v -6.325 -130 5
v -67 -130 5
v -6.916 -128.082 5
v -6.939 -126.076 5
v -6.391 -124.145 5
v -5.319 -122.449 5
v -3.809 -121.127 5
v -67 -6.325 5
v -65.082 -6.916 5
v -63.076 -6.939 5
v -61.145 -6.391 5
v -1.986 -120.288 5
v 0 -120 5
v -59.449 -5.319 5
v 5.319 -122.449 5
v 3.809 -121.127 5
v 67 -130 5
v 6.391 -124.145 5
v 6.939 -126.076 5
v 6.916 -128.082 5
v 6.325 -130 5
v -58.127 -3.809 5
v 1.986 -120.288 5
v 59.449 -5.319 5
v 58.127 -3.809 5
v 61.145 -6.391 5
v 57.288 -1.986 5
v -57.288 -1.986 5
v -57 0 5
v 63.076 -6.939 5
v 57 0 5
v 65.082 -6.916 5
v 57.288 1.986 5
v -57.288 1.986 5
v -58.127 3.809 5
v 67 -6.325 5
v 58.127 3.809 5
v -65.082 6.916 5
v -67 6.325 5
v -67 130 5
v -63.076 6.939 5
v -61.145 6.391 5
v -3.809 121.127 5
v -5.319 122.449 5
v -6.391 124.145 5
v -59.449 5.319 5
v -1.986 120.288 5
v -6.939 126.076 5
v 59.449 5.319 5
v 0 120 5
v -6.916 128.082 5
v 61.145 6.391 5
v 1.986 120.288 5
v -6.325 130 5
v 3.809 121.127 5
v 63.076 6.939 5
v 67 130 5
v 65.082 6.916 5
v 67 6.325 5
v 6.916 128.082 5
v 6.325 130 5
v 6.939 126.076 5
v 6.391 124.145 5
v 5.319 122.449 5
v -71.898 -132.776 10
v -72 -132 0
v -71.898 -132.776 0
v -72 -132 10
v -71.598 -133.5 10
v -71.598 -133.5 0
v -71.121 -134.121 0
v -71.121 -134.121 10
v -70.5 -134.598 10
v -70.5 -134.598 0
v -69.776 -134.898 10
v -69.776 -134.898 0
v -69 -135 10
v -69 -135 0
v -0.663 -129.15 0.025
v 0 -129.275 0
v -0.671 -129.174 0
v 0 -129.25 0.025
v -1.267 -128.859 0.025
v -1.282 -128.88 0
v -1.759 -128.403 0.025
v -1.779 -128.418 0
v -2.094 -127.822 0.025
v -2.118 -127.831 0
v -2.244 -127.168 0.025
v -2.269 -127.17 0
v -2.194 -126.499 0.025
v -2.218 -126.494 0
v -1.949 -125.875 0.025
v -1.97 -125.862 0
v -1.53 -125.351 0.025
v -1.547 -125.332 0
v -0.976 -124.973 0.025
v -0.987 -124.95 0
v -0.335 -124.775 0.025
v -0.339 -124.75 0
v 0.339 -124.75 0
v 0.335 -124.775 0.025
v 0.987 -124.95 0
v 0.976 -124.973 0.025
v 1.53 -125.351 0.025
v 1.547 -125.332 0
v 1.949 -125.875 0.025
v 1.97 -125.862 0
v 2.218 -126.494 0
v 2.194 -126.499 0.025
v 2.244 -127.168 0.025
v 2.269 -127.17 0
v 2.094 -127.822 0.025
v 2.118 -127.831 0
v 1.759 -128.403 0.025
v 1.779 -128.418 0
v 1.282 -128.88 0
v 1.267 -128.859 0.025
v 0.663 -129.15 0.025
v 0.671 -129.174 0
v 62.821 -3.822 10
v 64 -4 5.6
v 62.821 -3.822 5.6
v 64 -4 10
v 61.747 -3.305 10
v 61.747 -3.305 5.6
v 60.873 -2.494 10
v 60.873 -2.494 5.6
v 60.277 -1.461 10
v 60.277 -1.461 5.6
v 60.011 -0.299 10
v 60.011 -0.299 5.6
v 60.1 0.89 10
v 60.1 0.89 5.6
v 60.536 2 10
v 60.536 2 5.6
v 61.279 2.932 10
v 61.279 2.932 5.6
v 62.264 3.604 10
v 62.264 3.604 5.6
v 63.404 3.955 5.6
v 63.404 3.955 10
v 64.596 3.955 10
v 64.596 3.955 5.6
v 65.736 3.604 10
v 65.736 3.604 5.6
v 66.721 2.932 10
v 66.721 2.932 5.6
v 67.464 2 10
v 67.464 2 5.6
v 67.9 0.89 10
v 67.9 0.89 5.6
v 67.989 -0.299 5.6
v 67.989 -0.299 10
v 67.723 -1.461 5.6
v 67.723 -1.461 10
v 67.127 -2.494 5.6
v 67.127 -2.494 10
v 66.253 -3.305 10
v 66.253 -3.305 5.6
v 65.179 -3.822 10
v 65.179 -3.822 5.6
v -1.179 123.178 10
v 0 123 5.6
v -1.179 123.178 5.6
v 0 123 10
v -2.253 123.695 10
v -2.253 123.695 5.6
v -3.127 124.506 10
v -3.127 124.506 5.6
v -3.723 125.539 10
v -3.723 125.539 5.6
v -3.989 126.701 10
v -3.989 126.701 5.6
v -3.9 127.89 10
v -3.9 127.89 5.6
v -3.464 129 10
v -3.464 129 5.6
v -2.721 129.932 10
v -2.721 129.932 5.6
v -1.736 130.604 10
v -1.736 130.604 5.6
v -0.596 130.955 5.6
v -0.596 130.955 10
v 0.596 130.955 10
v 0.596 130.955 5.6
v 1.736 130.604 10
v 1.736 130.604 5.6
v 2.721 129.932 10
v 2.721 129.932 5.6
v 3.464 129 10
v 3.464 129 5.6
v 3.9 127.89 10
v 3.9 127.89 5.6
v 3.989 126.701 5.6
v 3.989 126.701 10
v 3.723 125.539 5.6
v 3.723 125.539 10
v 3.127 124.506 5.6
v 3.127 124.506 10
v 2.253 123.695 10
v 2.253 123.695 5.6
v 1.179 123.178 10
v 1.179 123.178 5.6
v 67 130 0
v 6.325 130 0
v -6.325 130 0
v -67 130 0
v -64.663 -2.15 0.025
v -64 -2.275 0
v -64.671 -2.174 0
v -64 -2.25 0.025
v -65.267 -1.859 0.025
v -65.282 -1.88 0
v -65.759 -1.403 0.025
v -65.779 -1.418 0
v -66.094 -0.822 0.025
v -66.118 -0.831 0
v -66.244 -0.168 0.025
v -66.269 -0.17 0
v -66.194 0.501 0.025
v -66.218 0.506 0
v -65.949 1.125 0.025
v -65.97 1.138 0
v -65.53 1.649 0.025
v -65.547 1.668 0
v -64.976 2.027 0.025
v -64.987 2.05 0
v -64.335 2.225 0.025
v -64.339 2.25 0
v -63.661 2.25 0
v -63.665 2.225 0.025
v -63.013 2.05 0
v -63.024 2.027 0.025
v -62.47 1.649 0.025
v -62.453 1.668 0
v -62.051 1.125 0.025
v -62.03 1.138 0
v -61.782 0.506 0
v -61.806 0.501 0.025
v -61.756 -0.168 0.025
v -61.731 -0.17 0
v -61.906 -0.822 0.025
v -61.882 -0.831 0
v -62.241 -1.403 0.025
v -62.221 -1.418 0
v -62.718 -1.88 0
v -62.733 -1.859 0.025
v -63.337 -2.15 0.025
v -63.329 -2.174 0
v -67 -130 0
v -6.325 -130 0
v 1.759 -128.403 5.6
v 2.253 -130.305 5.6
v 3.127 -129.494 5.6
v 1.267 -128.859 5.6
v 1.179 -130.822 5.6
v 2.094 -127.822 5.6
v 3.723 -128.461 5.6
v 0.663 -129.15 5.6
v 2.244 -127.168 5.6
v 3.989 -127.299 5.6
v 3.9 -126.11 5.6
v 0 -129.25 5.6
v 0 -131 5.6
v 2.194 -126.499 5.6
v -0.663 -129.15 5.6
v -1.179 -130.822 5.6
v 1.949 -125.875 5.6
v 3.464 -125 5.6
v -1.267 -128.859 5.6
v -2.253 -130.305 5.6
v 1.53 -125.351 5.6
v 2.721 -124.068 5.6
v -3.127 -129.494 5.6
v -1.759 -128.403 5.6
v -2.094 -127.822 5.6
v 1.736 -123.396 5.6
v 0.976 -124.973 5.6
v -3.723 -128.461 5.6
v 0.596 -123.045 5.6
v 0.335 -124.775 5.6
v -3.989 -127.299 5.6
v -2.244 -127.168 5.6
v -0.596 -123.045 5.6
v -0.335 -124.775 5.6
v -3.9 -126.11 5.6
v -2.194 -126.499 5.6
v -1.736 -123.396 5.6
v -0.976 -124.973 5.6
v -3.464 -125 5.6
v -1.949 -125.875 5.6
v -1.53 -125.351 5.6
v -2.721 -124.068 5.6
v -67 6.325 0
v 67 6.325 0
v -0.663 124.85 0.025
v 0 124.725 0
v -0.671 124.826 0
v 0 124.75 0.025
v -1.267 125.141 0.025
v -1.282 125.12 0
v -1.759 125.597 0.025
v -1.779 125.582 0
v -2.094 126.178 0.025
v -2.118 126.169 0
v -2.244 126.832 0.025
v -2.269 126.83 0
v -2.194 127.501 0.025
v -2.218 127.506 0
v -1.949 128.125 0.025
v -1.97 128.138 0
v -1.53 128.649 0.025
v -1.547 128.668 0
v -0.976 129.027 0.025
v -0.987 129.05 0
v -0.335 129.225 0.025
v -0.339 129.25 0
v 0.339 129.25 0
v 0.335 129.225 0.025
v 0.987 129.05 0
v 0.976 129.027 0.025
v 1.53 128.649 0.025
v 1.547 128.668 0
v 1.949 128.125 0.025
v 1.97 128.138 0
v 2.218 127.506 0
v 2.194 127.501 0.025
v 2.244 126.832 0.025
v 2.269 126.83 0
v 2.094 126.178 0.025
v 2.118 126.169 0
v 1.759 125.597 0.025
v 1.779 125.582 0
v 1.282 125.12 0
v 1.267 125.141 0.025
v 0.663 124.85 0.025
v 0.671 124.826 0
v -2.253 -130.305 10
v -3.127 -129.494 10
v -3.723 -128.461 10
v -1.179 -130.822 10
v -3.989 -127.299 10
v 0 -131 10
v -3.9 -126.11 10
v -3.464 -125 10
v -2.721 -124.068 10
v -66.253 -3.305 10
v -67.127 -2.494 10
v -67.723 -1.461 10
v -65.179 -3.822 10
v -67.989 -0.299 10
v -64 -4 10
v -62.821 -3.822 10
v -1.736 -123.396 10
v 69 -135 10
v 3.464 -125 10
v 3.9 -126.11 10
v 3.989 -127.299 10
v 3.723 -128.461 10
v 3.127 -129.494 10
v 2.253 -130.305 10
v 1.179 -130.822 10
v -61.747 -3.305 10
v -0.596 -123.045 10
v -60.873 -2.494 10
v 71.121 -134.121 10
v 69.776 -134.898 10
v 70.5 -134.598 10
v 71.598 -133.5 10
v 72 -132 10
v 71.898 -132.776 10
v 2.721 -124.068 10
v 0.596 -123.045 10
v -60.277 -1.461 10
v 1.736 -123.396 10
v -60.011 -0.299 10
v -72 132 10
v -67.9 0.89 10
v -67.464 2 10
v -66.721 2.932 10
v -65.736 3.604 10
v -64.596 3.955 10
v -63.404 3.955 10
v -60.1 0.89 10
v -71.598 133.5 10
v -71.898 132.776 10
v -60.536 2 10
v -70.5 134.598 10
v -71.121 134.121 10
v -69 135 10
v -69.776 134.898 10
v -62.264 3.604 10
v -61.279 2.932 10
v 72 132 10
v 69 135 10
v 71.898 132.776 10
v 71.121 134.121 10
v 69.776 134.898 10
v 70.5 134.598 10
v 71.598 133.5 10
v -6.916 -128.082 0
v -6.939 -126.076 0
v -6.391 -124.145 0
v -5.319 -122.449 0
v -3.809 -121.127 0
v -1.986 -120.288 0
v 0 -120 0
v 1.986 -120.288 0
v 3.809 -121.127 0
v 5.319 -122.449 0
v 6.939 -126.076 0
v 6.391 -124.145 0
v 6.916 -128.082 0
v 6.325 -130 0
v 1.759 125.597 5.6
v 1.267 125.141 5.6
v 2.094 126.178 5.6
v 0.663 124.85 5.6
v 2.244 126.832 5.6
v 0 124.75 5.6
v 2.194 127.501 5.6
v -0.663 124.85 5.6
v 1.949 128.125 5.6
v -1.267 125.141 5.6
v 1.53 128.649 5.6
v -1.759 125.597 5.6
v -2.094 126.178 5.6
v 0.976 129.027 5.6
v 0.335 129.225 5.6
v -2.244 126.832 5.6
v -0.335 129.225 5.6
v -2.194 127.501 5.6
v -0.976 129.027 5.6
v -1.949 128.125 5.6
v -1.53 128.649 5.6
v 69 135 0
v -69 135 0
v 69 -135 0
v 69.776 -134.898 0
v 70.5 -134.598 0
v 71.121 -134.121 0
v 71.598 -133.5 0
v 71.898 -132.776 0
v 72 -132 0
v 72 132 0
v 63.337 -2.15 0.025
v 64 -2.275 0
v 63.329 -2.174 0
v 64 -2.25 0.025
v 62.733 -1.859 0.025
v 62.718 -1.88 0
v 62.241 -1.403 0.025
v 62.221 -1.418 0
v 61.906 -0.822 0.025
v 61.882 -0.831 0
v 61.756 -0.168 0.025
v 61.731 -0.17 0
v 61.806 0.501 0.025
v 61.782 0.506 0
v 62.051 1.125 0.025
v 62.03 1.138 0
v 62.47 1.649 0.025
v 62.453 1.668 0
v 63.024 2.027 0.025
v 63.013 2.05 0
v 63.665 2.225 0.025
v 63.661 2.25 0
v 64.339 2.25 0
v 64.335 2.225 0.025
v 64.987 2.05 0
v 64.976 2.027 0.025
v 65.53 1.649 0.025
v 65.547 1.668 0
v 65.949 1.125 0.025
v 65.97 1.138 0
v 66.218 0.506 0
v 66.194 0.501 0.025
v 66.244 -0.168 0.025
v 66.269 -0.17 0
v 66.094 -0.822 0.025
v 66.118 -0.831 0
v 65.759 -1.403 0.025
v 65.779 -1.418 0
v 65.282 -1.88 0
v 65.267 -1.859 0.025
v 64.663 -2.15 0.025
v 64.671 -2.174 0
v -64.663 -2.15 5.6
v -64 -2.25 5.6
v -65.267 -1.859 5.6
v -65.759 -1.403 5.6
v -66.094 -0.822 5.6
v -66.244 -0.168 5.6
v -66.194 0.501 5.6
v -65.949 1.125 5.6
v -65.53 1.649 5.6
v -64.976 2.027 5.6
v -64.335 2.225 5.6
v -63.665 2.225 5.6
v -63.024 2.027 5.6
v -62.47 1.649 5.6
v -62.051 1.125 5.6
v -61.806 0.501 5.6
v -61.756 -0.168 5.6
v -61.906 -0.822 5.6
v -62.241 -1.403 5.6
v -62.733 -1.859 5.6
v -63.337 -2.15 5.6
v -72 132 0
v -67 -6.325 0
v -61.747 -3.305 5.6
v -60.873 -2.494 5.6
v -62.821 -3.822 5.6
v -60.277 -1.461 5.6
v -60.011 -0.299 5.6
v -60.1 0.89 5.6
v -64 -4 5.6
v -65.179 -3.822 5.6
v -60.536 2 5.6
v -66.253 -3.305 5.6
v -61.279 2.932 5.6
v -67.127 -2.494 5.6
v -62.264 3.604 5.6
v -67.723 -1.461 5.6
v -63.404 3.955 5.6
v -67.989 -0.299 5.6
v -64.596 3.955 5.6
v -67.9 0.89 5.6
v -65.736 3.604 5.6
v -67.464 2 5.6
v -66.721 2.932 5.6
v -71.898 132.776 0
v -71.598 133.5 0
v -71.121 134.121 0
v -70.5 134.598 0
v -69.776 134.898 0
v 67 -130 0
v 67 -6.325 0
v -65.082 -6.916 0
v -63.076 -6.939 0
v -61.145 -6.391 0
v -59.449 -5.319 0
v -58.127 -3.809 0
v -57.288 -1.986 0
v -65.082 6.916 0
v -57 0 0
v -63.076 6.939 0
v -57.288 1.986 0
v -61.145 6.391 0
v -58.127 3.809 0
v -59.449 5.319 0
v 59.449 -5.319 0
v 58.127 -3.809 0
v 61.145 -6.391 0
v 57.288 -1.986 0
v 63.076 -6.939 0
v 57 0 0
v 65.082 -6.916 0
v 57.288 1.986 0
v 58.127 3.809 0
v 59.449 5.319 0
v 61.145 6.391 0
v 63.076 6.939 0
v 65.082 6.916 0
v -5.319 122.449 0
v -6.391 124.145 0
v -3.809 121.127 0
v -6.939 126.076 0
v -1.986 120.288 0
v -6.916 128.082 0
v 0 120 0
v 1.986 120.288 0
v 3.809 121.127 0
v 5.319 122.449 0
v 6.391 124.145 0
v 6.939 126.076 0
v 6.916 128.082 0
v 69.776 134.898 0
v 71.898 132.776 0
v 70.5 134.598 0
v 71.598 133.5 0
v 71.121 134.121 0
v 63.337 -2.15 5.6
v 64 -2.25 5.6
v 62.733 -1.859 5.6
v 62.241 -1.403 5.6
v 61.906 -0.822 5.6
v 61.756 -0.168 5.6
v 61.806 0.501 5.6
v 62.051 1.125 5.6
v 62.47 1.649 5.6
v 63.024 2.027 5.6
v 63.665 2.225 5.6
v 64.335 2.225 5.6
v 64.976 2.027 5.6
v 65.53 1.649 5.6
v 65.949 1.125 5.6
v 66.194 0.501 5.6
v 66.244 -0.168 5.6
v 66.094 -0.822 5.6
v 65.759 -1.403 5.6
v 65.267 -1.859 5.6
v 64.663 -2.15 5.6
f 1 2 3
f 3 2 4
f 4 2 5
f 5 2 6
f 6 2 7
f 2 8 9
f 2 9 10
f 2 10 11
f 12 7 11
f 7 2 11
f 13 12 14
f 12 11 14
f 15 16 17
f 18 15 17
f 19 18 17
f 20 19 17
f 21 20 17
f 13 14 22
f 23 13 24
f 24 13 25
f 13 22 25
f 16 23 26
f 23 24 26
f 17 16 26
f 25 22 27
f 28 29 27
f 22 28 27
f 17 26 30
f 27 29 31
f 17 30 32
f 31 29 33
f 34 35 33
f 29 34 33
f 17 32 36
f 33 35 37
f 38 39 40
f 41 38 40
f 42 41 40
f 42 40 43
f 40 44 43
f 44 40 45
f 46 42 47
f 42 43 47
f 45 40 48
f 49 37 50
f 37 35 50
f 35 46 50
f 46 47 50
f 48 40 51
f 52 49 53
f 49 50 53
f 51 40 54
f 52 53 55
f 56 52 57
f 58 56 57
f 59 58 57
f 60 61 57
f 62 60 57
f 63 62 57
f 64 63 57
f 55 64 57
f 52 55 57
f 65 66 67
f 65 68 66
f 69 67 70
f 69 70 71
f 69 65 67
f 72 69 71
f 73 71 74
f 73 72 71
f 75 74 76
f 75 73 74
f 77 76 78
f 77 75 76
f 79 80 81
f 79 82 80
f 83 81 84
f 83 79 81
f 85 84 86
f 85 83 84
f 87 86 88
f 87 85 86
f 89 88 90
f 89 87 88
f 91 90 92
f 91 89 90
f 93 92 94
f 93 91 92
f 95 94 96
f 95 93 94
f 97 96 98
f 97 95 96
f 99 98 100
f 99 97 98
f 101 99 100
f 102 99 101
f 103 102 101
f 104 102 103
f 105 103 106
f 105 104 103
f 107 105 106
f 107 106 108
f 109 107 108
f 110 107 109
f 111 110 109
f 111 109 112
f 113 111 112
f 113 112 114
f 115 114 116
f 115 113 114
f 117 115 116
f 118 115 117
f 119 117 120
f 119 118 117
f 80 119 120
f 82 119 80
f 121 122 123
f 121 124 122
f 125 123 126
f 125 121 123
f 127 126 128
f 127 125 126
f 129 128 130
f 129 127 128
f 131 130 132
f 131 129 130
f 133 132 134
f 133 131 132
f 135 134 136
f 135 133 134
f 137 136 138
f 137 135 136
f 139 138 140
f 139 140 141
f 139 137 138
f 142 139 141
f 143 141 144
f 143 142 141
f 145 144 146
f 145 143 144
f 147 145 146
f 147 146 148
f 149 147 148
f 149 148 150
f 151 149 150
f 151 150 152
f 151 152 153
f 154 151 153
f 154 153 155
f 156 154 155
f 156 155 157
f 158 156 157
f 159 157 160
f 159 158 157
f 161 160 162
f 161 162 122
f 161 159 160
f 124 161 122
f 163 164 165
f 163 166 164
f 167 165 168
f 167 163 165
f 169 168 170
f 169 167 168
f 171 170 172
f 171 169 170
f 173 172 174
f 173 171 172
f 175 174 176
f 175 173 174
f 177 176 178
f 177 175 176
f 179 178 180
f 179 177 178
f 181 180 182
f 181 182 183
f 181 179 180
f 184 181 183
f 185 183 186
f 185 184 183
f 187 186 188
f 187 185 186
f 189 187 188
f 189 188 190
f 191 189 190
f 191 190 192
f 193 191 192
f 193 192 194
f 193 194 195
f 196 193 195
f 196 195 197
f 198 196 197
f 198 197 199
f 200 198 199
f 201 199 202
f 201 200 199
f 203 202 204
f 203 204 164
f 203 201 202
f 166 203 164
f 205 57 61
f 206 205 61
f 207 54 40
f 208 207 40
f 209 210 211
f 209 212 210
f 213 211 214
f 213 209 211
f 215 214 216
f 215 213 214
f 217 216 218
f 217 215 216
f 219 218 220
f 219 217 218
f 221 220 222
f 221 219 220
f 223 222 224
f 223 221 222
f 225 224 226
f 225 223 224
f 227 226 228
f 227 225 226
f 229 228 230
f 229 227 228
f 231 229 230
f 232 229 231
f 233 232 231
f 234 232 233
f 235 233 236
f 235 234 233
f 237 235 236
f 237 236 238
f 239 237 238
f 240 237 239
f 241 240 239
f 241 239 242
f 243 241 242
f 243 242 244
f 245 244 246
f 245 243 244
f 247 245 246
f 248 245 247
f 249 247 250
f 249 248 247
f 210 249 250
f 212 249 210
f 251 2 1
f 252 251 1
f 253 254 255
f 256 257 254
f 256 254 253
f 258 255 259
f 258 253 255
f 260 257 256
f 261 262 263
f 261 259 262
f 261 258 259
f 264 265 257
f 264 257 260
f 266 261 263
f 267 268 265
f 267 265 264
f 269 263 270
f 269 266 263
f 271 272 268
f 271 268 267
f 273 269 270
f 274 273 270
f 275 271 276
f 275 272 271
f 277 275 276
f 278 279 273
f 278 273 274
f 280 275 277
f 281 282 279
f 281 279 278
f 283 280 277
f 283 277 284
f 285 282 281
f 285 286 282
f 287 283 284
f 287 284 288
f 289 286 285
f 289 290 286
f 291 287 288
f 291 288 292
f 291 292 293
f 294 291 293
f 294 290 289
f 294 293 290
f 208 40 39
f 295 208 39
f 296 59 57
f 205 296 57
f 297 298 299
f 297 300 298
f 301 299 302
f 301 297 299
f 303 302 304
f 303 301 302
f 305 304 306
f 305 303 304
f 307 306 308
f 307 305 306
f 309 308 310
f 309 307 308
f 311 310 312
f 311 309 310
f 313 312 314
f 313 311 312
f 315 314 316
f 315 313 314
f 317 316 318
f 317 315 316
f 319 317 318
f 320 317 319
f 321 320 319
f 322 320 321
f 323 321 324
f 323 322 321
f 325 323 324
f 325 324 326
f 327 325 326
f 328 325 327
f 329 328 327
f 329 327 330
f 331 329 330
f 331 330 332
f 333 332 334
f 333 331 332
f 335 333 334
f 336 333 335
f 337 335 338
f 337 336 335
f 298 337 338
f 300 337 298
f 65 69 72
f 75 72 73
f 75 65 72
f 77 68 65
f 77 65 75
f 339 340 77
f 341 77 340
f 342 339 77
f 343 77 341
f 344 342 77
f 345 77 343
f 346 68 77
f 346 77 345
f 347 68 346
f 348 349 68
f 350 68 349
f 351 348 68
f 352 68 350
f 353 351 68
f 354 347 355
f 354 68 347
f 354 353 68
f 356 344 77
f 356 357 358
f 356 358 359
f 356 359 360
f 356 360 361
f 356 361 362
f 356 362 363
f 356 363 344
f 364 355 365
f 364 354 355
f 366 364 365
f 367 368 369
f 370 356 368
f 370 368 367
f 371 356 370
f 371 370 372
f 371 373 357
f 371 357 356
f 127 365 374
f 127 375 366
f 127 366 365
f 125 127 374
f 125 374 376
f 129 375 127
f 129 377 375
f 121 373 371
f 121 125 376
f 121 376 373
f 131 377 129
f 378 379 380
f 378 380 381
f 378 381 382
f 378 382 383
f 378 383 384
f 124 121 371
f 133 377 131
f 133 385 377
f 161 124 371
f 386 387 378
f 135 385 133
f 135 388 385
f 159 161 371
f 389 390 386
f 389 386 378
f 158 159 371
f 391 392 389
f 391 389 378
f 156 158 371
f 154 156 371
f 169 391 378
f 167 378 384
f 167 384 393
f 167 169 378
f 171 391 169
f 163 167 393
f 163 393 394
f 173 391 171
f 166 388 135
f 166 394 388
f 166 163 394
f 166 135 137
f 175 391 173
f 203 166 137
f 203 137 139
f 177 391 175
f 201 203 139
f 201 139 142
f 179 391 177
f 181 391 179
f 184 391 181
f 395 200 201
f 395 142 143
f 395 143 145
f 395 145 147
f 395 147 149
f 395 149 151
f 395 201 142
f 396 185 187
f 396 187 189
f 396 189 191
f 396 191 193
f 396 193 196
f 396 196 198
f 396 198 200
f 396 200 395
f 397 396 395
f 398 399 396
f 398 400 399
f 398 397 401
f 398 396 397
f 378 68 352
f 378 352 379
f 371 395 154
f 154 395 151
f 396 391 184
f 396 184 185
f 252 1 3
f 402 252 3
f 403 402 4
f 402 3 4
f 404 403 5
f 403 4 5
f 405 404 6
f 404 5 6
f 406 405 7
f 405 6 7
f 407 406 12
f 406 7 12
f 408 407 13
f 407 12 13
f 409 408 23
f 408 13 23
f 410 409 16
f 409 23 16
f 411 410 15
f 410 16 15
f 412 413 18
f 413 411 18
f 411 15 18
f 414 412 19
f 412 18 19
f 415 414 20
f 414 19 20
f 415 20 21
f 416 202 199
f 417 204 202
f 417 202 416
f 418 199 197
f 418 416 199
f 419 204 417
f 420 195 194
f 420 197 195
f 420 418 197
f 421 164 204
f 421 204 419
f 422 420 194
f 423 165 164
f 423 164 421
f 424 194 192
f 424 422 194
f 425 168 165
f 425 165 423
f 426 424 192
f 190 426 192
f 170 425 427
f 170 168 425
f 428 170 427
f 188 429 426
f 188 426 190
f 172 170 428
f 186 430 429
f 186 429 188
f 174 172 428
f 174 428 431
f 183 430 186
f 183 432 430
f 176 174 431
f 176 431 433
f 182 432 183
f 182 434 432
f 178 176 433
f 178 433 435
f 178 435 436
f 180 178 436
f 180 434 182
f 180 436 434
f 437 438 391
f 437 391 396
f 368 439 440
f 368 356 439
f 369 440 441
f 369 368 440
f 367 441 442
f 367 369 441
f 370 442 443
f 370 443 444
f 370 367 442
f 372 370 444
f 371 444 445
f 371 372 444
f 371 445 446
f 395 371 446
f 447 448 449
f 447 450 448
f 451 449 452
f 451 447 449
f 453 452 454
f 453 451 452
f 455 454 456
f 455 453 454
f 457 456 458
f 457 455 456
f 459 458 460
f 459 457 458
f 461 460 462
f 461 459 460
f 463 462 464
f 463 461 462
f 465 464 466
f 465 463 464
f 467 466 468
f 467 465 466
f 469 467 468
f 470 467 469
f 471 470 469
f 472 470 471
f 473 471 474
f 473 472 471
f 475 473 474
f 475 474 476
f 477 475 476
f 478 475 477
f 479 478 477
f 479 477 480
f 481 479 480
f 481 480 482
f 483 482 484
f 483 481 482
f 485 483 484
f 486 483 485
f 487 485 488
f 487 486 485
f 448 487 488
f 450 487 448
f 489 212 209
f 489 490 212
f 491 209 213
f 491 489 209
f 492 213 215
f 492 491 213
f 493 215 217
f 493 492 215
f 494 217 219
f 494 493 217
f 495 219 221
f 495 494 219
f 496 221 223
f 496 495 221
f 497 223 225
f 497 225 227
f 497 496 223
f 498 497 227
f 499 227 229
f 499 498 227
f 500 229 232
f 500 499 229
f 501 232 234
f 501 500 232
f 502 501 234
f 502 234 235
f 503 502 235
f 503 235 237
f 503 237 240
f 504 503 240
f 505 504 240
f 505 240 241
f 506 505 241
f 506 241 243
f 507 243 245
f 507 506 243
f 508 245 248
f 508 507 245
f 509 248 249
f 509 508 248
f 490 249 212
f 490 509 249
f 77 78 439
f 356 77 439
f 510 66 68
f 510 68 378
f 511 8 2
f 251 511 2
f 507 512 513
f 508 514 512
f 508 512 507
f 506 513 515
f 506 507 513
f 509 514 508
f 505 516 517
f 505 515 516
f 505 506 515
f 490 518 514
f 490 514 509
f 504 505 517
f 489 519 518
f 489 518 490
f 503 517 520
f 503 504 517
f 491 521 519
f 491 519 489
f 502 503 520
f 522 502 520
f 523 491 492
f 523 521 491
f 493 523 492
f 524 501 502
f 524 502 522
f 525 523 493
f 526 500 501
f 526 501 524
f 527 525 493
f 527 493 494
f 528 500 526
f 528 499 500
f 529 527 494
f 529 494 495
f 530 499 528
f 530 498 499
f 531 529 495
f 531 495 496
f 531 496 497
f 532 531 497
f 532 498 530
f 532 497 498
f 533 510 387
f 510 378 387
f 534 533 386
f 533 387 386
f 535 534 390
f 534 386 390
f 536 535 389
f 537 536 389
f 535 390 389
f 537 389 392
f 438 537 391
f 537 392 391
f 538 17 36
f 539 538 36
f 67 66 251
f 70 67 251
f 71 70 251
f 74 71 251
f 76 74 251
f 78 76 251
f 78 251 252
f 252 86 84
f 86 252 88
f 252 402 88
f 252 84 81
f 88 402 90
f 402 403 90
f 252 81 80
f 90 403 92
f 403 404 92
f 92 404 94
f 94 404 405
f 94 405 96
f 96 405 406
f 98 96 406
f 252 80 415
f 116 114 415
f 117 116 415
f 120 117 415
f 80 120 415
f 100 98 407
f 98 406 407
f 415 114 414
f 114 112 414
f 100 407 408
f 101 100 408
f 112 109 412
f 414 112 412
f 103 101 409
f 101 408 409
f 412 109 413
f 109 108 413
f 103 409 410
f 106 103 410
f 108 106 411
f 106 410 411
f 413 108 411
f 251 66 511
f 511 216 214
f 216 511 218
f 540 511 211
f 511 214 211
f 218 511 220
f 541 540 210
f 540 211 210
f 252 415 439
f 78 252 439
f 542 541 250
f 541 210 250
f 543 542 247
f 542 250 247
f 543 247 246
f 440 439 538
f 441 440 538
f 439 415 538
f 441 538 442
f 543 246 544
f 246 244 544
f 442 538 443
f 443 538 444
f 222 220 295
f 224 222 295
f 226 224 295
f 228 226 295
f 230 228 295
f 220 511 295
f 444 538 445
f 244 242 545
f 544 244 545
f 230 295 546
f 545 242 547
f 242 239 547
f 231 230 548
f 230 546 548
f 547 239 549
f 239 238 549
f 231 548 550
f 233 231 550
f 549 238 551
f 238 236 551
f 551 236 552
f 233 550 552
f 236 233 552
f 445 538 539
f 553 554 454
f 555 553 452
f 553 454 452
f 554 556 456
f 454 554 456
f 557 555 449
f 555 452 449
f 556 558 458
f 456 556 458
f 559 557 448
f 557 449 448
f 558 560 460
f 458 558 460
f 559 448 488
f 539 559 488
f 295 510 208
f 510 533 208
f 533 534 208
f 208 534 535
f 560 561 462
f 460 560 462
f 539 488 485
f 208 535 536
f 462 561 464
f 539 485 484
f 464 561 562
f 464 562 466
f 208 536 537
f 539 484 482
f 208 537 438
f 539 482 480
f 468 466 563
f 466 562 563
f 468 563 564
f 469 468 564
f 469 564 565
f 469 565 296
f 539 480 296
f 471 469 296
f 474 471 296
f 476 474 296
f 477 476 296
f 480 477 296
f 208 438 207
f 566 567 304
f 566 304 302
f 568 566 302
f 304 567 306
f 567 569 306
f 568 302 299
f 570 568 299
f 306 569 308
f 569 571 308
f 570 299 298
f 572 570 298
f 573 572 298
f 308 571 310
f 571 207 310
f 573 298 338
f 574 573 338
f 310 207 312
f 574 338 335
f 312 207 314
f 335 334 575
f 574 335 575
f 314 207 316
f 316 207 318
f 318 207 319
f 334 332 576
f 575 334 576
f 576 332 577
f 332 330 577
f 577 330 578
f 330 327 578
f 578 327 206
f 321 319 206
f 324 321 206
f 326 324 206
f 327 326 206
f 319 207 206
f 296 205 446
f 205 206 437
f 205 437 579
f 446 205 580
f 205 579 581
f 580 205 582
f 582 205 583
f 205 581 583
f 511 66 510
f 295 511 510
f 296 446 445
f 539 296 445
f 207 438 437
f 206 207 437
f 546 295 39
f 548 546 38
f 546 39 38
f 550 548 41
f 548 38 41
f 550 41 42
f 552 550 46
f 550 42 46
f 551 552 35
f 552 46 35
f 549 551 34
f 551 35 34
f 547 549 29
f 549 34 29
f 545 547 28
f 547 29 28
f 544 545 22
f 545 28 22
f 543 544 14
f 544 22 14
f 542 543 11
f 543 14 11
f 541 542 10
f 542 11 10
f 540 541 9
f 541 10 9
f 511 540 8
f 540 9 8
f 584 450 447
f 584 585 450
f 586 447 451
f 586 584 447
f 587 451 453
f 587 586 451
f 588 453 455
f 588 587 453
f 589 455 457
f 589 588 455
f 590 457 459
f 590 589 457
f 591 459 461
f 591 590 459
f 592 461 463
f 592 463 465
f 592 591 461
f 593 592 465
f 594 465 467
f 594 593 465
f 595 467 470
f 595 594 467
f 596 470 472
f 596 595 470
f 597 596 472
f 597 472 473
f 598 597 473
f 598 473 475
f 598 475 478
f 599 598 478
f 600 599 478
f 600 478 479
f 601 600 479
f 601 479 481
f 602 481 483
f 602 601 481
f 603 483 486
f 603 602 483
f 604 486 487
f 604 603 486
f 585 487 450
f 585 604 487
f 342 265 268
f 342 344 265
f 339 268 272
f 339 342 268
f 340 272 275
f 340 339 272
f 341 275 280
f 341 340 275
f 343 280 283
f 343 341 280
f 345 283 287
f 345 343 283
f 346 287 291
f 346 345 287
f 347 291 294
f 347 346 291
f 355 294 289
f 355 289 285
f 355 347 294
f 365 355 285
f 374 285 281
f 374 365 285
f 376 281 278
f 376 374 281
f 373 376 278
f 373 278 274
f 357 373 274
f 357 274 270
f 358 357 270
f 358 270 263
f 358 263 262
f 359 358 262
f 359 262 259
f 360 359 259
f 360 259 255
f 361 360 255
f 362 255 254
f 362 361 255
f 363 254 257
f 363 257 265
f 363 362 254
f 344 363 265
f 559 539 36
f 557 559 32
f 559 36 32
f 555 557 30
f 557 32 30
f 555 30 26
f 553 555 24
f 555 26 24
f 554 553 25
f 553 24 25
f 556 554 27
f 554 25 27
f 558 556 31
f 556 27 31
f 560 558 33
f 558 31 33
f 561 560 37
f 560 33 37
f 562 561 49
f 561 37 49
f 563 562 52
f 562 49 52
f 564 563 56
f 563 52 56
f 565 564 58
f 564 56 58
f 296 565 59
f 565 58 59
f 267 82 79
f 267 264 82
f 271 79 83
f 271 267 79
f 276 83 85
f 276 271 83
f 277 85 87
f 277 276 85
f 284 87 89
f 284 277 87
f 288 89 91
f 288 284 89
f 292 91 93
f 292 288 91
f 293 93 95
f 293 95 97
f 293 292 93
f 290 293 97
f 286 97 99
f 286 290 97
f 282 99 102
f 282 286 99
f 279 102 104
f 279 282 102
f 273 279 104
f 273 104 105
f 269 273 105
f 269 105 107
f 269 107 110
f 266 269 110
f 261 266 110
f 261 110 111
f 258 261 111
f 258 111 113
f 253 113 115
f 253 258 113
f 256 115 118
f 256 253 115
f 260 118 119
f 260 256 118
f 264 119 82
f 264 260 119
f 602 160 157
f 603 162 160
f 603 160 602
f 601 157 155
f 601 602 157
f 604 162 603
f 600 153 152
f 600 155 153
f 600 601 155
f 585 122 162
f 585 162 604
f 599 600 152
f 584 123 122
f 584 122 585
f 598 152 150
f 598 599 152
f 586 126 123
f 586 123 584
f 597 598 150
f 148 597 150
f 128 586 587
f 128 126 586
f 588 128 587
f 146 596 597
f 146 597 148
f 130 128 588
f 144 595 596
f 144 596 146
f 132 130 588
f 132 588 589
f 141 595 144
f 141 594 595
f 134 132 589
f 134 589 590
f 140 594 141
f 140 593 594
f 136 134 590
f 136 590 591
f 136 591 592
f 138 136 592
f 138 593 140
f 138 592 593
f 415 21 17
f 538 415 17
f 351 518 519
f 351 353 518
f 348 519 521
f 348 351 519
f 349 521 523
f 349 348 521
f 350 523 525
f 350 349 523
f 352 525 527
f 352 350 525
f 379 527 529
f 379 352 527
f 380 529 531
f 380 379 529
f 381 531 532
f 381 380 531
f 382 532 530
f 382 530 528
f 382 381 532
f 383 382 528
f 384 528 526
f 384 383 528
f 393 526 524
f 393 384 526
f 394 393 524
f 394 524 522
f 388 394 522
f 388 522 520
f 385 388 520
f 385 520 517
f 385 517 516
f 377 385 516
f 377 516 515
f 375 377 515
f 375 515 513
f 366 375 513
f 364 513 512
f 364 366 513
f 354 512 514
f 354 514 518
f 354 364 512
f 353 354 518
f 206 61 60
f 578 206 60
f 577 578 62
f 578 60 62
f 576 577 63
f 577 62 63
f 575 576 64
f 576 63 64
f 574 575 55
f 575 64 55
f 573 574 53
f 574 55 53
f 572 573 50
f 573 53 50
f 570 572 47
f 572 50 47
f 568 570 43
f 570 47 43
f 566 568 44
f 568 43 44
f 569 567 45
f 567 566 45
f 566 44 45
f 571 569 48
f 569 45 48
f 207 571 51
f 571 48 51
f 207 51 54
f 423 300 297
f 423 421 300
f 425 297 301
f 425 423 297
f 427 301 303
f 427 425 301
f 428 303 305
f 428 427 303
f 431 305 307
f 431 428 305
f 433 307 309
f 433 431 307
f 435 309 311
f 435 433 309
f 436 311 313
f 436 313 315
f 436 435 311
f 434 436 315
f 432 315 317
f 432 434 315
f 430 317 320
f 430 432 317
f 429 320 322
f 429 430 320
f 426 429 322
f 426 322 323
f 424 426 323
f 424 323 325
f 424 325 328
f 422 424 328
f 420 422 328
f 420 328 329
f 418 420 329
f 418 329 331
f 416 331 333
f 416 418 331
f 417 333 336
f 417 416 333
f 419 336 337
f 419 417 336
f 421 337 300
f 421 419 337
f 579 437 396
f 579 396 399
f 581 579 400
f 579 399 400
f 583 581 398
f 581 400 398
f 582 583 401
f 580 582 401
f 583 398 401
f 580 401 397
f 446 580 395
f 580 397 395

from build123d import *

# Parameters (mm, degrees)
SKETCH1_W                                    = 144
SKETCH1_H                                    = 270
BOSS_EXTRUDE1_DEPTH                          = 10
CBORE_FOR_M4_HEX_SOCKET_HEAD_CAP_SCR_2_COUNT = 2
CBORE_FOR_M4_HEX_SOCKET_HEAD_CAP_SCR_2_PITCH = 142.214626533
CBORE_FOR_M4_HEX_SOCKET_HEAD_CAP_SCR_3_COUNT = 2
CBORE_FOR_M4_HEX_SOCKET_HEAD_CAP_SCR_3_PITCH = 254
CBORE_FOR_M4_HEX_SOCKET_HEAD_CAP_SCR_4_COUNT = 2
CBORE_FOR_M4_HEX_SOCKET_HEAD_CAP_SCR_4_PITCH = 142.214626533
CUT_EXTRUDE1_REACH                           = 160.326
CUT_EXTRUDE1_START                           = -5
FILLET1_R                                    = 3


with BuildPart() as part:
    # Sketch1 → Boss-Extrude1 (new body)
    with BuildSketch(Plane.XY):
        Rectangle(SKETCH1_W, SKETCH1_H)
    extrude(amount=BOSS_EXTRUDE1_DEPTH)

    # Sketch3 → CBORE for M4 Hex Socket Head Cap Screw1 (revolve, cut)
    with BuildSketch(Plane(origin=(0, 127, 10), x_dir=(0, -1, 0), z_dir=(1, 0, 0))):
        Polygon((0, 0), (0, 10), (2.275, 10), (2.25, 9.975), (2.25, 4.4), (4, 4.4), (4, 0), align=None)
    cbore_for_m4_hex_socket_head_cap_screw1 = revolve(axis=Axis((0, 127, 16.35), (0, 0, -1)), mode=Mode.SUBTRACT)

    # CBORE for M4 Hex Socket Head Cap Scr 2: CBORE for M4 Hex Socket Head Cap Screw1 ×2
    with Locations(*[Vector(-0.4500240345181632, -0.8930164434969801, 0) * (i * CBORE_FOR_M4_HEX_SOCKET_HEAD_CAP_SCR_2_PITCH) for i in range(1, CBORE_FOR_M4_HEX_SOCKET_HEAD_CAP_SCR_2_COUNT)]):
        add(cbore_for_m4_hex_socket_head_cap_screw1, mode=Mode.SUBTRACT)

    # CBORE for M4 Hex Socket Head Cap Scr 3: CBORE for M4 Hex Socket Head Cap Screw1 ×2
    with Locations(*[(0, -i * CBORE_FOR_M4_HEX_SOCKET_HEAD_CAP_SCR_3_PITCH, 0) for i in range(1, CBORE_FOR_M4_HEX_SOCKET_HEAD_CAP_SCR_3_COUNT)]):
        add(cbore_for_m4_hex_socket_head_cap_screw1, mode=Mode.SUBTRACT)

    # CBORE for M4 Hex Socket Head Cap Scr 4: CBORE for M4 Hex Socket Head Cap Screw1 ×2
    with Locations(*[Vector(0.4500240345181632, -0.8930164434969801, 0) * (i * CBORE_FOR_M4_HEX_SOCKET_HEAD_CAP_SCR_4_PITCH) for i in range(1, CBORE_FOR_M4_HEX_SOCKET_HEAD_CAP_SCR_4_COUNT)]):
        add(cbore_for_m4_hex_socket_head_cap_screw1, mode=Mode.SUBTRACT)

    # Sketch4 → Cut-Extrude1 (cut, up to next)
    with BuildSketch(Plane.XY.offset(10).offset(CUT_EXTRUDE1_START), mode=Mode.PRIVATE) as cut_extrude1_sk1:
        with BuildLine():
            Line((-67, -6.32455532), (-67, -130))
            Line((-67, -130), (-6.32455532, -130))
            ThreePointArc((-6.32455532, -130), (0, -120), (6.32455532, -130))
            Line((6.32455532, -130), (67, -130))
            Line((67, -130), (67, -6.32455532))
            ThreePointArc((67, -6.32455532), (57, 0), (67, 6.32455532))
            Line((67, 6.32455532), (67, 130))
            Line((67, 130), (6.32455532, 130))
            ThreePointArc((6.32455532, 130), (0, 120), (-6.32455532, 130))
            Line((-6.32455532, 130), (-67, 130))
            Line((-67, 130), (-67, 6.32455532))
            ThreePointArc((-67, 6.32455532), (-57, 0), (-67, -6.32455532))
        make_face()
    cut_extrude1_tool1 = extrude(cut_extrude1_sk1.sketch, amount=-CUT_EXTRUDE1_REACH, mode=Mode.PRIVATE) & part.part
    add(cut_extrude1_tool1.solids().sort_by_distance((0, 0, 5))[0], mode=Mode.SUBTRACT)

    # Fillet1
    fillet1_edges = [part.edges().sort_by_distance(p)[0] for p in [
        (-72, 135, 5),
        (72, 135, 5),
        (72, -135, 5),
        (-72, -135, 5),
    ]]
    fillet(fillet1_edges, radius=FILLET1_R)


solid = part.part
